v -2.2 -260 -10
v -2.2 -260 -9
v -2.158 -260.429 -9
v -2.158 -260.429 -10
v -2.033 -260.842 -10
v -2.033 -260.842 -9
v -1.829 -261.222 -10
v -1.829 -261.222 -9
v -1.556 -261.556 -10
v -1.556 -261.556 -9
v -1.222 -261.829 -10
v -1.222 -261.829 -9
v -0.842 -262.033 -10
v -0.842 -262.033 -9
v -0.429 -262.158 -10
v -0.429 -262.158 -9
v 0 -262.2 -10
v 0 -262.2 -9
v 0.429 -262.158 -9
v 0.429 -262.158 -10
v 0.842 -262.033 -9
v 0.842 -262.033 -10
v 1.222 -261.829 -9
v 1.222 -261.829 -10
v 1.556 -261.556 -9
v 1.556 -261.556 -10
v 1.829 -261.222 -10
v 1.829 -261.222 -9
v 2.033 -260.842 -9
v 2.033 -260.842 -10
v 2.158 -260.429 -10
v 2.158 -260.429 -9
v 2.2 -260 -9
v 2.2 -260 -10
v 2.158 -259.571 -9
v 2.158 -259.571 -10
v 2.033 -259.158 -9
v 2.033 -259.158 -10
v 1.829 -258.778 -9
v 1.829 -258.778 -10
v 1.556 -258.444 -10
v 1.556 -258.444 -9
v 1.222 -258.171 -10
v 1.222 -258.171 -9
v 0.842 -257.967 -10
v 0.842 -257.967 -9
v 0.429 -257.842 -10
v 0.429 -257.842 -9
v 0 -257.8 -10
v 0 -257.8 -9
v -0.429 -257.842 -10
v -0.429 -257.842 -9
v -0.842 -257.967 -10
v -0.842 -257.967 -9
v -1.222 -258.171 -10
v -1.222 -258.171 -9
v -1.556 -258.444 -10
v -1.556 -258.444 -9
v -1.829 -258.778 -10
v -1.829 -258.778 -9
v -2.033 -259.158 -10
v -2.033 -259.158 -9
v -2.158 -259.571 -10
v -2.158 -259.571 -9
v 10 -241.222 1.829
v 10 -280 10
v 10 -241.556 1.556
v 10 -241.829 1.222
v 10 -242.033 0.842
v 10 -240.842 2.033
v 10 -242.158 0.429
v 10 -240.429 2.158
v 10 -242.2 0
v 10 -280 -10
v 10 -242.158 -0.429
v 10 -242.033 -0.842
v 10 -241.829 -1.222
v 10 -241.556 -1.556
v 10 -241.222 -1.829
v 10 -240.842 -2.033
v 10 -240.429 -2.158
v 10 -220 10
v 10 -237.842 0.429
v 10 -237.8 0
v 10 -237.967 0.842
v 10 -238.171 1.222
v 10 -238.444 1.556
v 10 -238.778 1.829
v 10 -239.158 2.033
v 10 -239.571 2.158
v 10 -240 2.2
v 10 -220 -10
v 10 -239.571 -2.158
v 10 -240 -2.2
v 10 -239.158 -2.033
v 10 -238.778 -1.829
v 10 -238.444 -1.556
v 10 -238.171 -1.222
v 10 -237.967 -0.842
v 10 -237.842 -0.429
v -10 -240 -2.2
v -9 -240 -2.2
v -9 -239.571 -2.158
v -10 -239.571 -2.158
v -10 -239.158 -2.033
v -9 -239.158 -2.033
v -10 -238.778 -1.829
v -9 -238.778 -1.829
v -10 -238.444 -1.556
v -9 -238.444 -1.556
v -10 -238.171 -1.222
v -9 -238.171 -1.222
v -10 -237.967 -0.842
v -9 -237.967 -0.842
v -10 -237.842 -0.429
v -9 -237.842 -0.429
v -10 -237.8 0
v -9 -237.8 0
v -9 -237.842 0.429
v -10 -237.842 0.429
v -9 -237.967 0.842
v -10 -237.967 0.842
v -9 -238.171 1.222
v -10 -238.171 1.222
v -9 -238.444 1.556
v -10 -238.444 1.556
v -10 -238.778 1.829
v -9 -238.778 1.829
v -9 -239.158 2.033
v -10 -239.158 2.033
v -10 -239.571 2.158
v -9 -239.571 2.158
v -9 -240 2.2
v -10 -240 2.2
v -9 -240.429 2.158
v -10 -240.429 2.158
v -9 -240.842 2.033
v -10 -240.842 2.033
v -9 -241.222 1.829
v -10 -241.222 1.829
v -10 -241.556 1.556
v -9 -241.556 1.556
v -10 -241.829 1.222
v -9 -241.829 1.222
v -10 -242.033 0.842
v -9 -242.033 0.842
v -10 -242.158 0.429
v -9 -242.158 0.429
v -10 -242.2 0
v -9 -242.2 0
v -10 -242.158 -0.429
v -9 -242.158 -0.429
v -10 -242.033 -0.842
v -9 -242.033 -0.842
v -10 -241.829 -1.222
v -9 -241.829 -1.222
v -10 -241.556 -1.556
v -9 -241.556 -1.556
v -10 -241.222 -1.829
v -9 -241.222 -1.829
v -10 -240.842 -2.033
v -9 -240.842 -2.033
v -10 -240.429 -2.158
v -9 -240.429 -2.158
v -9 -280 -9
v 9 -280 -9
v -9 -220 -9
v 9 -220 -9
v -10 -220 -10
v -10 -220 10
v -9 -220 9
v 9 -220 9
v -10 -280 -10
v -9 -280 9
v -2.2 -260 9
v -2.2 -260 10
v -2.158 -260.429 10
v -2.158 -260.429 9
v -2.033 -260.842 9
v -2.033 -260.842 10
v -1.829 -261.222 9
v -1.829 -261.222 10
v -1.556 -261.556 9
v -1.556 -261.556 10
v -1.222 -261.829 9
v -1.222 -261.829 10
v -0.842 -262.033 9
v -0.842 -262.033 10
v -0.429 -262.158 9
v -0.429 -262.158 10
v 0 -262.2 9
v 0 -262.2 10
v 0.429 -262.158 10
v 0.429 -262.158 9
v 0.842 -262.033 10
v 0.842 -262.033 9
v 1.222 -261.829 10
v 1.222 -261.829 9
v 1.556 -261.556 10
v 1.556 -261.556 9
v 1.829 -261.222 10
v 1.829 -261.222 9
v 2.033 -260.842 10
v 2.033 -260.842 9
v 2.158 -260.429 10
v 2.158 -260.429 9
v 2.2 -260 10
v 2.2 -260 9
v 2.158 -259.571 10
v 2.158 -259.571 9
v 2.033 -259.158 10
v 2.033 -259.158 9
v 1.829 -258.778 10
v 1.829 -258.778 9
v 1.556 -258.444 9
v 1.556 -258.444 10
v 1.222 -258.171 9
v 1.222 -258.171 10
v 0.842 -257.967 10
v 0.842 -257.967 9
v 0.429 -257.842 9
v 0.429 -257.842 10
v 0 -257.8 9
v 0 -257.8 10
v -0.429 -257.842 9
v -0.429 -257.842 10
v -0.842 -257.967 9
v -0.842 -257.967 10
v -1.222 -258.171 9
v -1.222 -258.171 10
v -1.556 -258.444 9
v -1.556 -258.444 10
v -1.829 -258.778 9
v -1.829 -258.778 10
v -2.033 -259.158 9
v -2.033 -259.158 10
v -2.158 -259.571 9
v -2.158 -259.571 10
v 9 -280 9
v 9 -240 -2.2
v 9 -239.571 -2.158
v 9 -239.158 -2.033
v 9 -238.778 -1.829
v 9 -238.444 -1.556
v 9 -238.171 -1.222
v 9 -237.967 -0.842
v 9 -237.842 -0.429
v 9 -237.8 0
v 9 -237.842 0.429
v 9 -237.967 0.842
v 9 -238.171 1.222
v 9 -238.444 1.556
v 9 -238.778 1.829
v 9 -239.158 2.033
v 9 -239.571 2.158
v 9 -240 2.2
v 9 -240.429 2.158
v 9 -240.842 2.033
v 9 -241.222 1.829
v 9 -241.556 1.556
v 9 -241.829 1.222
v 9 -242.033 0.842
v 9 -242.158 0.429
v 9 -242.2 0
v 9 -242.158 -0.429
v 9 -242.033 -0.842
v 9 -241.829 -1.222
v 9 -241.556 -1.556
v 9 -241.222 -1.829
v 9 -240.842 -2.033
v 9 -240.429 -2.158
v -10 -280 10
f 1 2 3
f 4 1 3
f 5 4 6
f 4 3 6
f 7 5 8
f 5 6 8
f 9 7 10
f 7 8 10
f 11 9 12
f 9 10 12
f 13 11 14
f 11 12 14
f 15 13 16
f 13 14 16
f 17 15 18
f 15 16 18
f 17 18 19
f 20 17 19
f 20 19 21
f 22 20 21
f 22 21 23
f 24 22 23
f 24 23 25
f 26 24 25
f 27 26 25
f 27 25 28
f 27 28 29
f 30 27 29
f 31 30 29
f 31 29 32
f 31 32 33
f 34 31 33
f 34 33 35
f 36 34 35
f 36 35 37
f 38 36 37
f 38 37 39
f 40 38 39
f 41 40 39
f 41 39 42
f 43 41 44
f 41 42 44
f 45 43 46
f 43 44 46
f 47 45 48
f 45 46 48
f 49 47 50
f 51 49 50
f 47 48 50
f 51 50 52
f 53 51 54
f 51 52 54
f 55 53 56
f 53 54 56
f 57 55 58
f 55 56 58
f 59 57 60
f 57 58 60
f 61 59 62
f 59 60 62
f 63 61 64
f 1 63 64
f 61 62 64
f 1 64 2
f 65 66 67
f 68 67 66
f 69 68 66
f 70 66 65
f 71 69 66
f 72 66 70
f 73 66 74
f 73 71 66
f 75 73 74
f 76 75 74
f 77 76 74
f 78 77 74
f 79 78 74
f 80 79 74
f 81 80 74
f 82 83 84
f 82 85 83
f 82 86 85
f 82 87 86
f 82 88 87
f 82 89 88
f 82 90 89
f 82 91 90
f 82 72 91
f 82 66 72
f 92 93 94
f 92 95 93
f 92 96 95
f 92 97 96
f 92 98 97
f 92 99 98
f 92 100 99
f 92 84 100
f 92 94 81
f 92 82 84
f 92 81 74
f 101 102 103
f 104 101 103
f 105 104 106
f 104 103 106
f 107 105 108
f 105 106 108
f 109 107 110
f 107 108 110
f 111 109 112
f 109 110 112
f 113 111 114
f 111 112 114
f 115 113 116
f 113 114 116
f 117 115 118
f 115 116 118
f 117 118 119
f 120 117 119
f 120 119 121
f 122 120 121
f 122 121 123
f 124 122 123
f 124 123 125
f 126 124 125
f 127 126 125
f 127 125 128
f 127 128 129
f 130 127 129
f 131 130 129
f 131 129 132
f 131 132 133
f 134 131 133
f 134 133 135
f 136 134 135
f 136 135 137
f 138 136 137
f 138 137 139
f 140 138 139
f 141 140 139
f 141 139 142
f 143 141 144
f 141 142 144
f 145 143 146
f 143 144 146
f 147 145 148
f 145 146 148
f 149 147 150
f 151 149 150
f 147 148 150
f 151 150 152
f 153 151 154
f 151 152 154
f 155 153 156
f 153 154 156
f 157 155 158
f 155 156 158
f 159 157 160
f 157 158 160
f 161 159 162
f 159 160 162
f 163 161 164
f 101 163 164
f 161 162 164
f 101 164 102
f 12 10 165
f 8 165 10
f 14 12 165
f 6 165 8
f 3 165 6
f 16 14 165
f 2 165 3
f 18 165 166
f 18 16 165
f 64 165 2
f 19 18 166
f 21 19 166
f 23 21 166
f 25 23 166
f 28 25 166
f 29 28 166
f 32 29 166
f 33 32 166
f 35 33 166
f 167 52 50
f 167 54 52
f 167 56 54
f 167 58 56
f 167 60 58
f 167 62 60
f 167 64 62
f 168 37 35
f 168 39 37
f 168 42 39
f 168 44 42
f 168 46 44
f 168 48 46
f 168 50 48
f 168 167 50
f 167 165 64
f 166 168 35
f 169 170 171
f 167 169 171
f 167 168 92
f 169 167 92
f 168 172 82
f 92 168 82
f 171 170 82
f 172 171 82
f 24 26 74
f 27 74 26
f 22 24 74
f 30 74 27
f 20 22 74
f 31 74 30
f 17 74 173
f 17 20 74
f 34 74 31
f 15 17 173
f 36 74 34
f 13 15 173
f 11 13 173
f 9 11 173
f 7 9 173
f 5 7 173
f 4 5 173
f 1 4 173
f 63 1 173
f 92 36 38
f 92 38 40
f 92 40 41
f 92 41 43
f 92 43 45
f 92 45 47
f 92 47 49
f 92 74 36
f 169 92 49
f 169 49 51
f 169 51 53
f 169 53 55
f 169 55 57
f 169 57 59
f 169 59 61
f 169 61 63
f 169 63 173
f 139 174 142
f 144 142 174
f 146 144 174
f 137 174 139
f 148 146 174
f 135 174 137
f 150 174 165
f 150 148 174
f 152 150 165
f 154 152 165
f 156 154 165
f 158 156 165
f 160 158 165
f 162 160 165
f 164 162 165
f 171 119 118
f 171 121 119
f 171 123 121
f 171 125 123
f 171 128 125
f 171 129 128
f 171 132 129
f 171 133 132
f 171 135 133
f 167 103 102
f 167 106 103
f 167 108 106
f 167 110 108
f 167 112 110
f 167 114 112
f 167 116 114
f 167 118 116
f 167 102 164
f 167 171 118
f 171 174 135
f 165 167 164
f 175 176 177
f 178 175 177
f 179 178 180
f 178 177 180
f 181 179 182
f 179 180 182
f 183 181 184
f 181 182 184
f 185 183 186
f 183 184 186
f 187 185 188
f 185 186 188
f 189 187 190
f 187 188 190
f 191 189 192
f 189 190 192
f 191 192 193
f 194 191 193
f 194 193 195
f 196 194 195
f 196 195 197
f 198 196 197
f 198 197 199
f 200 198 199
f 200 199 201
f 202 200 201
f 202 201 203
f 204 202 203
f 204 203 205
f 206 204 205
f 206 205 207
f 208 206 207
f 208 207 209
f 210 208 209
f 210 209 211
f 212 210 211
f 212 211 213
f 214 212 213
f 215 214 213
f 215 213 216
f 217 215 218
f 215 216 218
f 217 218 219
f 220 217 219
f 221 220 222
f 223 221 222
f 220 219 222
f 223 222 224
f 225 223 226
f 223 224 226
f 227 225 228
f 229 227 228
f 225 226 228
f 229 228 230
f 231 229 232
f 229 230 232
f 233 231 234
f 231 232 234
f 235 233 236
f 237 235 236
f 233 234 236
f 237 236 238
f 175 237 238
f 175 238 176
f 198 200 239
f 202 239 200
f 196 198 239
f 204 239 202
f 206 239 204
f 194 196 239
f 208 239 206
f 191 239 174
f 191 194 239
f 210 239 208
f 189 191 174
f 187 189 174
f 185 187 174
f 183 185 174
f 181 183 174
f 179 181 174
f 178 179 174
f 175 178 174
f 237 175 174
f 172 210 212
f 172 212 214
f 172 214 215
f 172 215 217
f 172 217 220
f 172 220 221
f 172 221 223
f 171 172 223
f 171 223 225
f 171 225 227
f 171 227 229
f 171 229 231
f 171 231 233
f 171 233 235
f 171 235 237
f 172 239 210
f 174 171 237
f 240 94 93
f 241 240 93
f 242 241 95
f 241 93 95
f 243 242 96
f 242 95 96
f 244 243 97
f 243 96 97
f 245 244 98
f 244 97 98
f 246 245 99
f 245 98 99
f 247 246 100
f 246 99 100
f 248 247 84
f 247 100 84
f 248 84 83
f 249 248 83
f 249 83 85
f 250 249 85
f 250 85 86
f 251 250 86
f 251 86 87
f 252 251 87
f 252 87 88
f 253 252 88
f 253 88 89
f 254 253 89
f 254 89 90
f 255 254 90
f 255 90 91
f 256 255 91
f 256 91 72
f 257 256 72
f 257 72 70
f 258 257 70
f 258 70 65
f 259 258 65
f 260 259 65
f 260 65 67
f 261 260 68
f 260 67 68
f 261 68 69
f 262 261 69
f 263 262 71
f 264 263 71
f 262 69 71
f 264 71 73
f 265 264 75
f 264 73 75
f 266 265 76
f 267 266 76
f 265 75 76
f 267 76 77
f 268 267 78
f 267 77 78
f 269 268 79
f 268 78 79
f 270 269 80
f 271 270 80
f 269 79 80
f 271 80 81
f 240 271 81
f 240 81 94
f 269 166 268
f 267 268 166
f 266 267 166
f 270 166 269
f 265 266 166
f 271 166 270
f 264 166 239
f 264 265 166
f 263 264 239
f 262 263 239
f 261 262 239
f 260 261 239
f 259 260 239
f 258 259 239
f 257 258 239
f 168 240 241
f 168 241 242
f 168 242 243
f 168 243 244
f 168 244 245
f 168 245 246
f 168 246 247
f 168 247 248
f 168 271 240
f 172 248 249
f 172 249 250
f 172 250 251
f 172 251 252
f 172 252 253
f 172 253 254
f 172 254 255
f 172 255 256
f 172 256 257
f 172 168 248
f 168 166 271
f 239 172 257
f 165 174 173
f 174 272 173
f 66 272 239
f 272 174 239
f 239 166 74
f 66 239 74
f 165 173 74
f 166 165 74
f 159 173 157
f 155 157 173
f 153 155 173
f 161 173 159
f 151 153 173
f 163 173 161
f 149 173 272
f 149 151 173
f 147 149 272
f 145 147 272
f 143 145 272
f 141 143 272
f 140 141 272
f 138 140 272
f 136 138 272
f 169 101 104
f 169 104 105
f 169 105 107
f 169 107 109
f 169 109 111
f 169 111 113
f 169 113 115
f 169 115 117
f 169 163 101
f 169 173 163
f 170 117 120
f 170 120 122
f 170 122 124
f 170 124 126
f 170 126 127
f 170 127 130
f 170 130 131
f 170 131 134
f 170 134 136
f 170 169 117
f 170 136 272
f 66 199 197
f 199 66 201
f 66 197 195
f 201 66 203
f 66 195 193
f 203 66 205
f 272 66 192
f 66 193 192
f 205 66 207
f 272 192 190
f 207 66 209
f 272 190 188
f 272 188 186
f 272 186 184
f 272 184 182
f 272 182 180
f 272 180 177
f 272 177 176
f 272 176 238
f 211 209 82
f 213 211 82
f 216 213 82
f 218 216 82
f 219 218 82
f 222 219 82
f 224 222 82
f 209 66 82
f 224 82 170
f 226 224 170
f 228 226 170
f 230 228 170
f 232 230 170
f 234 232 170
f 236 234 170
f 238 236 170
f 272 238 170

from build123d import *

# Parameters (mm, degrees)
EXTRUDE_1_DEPTH     = 280
SKETCH_2_R          = 2.2
CUT_EXTRUDE_1_DEPTH = 280
SKETCH_3_R          = 2.2
CUT_EXTRUDE_2_DEPTH = 20
CUT_EXTRUDE_3_DEPTH = 59
EXTRUDE_3_DEPTH     = 20
SKETCH_6_W          = 4.4
SKETCH_6_H          = 18
CUT_EXTRUDE_4_DEPTH = 20


with BuildPart() as part:
    # 草图1 → 凸台-拉伸1 (new body)
    with BuildSketch(Plane(origin=(0, 0, 0), x_dir=(1, 0, 0), z_dir=(0, 1, 0))):
        Polygon((10, 0), (10, 10), (0, 10), (-10, 10), (-10, 0), (-10, -10), (0, -10), (10, -10), align=None)
        Polygon((9, 0), (9, 9), (0, 9), (-9, 9), (-9, 0), (-9, -9), (0, -9), (9, -9), align=None, mode=Mode.SUBTRACT)
    extrude(amount=-EXTRUDE_1_DEPTH)

    # 草图2 → 切除-拉伸1 (cut)
    with BuildSketch(Plane.XY.offset(10)):
        with Locations(Location((0, -40, 0), (0, 0, 180))):
            Circle(SKETCH_2_R)
        with Locations(Location((0, -80, 0), (0, 0, 180))):
            Circle(SKETCH_2_R)
        with Locations(Location((0, -120, 0), (0, 0, 180))):
            Circle(SKETCH_2_R)
        with Locations(Location((0, -180, 0), (0, 0, 180))):
            Circle(SKETCH_2_R)
        with Locations(Location((0, -220, 0), (0, 0, 180))):
            Circle(SKETCH_2_R)
        with Locations(Location((0, -260, 0), (0, 0, 180))):
            Circle(SKETCH_2_R)
    extrude(amount=-CUT_EXTRUDE_1_DEPTH, mode=Mode.SUBTRACT)

    # 草图3 → 切除-拉伸2 (cut)
    with BuildSketch(Plane(origin=(10, 0, 0), x_dir=(0, 0, -1), z_dir=(1, 0, 0))):
        with Locations((0, -60)):
            Circle(SKETCH_3_R)
        with Locations((0, -100)):
            Circle(SKETCH_3_R)
        with Locations((0, -150)):
            Circle(SKETCH_3_R)
        with Locations((0, -200)):
            Circle(SKETCH_3_R)
        with Locations((0, -240)):
            Circle(SKETCH_3_R)
    extrude(amount=-CUT_EXTRUDE_2_DEPTH, mode=Mode.SUBTRACT)

    # 草图4 → 切除-拉伸3 (cut)
    with BuildSketch(Plane.XY.offset(10)):
        Polygon((0, -220), (10, -220), (10, 0), (-10, 0), (-10, -220), align=None)
    extrude(amount=-CUT_EXTRUDE_3_DEPTH, mode=Mode.SUBTRACT)

    # 草图5 → 凸台-拉伸3 (add)
    with BuildSketch(Plane.XY.offset(10)):
        with BuildLine():
            Line((-2.2, -220), (2.2, -220))
            ThreePointArc((2.2, -220), (0, -222.2), (-2.2, -220))
        make_face()
    extrude(amount=-EXTRUDE_3_DEPTH)

    # 草图6 → 切除-拉伸4 (cut)
    with BuildSketch(Plane(origin=(0, -220, 0), x_dir=(1, 0, 0), z_dir=(0, 1, 0))):
        Rectangle(SKETCH_6_W, SKETCH_6_H)
    extrude(amount=-CUT_EXTRUDE_4_DEPTH, mode=Mode.SUBTRACT)


solid = part.part
